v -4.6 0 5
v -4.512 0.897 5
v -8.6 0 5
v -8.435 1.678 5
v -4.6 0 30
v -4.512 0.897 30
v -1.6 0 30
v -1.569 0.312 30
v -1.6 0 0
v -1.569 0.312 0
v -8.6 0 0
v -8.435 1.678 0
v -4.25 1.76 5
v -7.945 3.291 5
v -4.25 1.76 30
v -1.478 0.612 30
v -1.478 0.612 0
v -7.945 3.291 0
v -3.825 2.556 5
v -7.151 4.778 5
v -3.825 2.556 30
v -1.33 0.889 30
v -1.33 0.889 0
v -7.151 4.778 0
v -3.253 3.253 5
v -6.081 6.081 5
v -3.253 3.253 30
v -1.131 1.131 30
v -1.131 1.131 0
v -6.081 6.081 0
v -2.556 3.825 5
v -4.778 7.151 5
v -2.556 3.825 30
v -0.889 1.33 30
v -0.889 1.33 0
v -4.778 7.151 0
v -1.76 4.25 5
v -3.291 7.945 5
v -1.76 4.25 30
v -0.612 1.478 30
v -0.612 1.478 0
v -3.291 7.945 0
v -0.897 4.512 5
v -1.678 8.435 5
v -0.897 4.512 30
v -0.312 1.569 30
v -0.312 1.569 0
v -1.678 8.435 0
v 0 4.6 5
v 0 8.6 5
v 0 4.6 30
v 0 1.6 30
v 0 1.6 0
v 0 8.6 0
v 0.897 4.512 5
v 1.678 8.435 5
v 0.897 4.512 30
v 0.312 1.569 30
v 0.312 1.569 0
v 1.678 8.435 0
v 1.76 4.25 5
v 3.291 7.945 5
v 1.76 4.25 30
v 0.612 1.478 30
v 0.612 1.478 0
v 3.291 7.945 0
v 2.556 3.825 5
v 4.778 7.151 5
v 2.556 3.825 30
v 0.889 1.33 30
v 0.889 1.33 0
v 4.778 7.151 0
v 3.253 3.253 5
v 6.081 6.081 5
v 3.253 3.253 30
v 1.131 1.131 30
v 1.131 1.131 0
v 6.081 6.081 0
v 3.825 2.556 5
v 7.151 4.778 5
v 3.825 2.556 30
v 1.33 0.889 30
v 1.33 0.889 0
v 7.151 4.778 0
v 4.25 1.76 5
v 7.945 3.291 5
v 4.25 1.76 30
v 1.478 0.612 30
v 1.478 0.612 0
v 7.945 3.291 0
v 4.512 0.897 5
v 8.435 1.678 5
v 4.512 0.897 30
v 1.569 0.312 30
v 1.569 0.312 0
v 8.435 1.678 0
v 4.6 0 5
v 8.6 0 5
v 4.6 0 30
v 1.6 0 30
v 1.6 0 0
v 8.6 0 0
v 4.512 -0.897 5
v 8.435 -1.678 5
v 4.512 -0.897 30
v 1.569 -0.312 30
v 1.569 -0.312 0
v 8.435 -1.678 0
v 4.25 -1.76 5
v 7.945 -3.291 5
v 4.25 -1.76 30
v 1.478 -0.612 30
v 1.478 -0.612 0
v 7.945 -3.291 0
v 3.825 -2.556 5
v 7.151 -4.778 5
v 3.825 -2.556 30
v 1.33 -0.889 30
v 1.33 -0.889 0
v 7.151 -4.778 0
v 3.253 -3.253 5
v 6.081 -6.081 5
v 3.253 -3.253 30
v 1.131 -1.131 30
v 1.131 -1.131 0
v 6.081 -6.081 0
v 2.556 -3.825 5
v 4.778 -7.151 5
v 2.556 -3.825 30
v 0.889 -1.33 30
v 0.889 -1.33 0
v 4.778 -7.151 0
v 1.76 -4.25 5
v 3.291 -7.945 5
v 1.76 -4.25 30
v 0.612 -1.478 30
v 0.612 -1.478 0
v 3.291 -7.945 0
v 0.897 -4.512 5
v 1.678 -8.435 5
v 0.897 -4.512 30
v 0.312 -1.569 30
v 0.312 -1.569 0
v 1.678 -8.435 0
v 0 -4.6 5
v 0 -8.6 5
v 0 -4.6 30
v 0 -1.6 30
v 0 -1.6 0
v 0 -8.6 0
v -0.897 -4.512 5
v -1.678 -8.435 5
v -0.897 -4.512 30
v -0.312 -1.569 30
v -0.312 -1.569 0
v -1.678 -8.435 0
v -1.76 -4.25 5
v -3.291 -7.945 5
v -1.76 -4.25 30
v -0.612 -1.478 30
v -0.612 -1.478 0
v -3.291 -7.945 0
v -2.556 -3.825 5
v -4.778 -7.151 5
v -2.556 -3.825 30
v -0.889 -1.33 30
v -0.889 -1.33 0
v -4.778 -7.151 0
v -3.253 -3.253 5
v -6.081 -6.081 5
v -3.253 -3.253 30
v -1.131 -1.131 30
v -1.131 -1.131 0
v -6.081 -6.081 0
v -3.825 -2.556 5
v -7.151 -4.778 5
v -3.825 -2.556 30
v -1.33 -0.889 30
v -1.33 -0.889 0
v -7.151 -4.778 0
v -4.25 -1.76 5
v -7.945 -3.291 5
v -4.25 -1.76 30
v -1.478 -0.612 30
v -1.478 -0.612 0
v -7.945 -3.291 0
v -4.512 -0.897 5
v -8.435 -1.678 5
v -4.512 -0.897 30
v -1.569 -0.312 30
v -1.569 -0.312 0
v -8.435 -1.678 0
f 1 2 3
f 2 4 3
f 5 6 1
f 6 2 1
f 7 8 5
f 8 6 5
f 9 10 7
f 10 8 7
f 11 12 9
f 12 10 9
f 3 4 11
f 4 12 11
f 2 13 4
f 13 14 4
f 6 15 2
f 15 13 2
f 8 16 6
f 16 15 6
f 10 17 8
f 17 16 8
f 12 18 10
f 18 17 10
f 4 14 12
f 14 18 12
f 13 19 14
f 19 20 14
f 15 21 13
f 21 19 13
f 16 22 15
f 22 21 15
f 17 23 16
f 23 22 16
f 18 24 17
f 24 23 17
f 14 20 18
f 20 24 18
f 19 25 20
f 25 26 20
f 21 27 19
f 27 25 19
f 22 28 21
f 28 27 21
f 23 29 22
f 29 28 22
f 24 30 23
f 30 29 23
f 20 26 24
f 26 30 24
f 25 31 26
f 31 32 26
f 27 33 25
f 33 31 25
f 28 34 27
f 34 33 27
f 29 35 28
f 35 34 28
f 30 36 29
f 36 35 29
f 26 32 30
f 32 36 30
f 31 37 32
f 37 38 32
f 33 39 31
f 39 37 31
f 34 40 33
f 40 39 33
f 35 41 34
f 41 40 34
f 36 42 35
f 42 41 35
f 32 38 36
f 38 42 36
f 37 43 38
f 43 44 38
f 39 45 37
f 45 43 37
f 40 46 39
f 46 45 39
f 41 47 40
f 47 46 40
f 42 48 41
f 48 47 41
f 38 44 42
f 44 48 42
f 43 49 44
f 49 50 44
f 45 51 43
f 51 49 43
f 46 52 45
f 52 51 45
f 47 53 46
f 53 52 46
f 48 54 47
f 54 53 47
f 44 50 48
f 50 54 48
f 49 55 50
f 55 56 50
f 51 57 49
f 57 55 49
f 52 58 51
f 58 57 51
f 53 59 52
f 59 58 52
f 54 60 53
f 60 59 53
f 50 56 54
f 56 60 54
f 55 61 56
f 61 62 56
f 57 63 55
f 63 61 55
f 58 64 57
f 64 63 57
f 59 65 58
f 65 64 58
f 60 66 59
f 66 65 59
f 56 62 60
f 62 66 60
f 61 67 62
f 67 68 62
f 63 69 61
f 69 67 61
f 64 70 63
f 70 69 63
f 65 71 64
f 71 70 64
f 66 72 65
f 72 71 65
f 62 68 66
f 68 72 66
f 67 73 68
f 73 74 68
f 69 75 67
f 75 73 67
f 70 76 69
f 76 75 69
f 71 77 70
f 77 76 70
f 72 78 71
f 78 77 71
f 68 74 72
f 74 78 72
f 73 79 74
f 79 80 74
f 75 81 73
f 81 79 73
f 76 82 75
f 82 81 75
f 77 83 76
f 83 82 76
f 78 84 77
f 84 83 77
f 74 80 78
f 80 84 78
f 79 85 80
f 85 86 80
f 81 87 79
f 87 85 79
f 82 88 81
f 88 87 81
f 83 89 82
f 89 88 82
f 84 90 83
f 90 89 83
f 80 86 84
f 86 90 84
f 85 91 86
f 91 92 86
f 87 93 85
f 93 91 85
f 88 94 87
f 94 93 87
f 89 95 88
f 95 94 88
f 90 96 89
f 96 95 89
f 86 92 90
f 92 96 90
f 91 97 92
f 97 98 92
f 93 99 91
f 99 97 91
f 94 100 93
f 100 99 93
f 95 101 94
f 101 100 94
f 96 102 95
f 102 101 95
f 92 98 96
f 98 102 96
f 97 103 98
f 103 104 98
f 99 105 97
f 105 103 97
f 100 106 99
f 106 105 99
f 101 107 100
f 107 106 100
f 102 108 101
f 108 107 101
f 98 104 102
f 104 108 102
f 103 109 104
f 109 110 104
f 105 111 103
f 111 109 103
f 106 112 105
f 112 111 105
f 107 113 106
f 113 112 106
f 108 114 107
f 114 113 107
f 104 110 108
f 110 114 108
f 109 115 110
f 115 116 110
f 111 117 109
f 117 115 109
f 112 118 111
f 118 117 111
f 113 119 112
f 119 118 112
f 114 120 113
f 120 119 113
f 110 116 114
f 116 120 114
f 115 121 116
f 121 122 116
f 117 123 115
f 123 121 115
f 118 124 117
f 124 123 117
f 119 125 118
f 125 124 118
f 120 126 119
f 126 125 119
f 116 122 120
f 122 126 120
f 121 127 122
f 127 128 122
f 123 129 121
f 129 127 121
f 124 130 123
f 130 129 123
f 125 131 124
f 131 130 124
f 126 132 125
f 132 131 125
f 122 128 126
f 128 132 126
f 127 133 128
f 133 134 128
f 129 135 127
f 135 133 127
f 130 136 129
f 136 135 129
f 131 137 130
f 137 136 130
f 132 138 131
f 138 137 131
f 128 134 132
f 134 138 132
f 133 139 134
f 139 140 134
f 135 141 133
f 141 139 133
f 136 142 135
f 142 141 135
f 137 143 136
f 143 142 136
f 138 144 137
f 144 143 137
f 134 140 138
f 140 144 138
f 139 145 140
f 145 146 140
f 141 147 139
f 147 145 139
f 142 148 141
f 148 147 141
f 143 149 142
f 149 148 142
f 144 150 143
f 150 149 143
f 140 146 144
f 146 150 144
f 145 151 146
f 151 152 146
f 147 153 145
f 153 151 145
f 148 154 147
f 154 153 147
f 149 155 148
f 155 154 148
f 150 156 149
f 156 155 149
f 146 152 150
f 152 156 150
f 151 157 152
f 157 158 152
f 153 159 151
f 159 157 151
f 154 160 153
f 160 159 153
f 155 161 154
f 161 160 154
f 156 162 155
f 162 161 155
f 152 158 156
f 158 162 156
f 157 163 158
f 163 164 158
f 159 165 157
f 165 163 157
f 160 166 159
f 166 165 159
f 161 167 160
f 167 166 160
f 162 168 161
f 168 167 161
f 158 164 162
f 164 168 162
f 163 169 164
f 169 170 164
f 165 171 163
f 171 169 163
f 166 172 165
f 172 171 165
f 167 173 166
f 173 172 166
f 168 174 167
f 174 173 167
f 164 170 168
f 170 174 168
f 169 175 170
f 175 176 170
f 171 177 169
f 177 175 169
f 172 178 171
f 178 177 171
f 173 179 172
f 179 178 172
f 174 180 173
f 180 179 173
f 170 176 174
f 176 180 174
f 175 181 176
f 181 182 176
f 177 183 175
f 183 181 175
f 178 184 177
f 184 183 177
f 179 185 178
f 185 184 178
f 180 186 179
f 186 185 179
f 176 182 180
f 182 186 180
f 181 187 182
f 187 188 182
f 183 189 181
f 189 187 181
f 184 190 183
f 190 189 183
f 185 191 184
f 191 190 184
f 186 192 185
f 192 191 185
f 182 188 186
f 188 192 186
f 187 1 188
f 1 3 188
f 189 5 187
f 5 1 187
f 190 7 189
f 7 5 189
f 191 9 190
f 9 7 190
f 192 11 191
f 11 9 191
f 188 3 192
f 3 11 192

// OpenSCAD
$fn = 32;

// ----------------------------------------------------------------------
// Profiled standoff: flanged spacer, 30 mm long, bore 3.2 mm
// ----------------------------------------------------------------------

// --- parameters (mm) ---
revolve_angle = 360;      // full turn around the Z axis
profile_points = 6;       // points of the closed outline

profile = [[1.6, 0], [8.6, 0], [8.6, 5], [4.6, 5], [4.6, 30], [1.6, 30]];  // single closed polygon, 6 points, counter clockwise

// --- the one profile operation ---
rotate_extrude(angle = revolve_angle) polygon(points = profile);
